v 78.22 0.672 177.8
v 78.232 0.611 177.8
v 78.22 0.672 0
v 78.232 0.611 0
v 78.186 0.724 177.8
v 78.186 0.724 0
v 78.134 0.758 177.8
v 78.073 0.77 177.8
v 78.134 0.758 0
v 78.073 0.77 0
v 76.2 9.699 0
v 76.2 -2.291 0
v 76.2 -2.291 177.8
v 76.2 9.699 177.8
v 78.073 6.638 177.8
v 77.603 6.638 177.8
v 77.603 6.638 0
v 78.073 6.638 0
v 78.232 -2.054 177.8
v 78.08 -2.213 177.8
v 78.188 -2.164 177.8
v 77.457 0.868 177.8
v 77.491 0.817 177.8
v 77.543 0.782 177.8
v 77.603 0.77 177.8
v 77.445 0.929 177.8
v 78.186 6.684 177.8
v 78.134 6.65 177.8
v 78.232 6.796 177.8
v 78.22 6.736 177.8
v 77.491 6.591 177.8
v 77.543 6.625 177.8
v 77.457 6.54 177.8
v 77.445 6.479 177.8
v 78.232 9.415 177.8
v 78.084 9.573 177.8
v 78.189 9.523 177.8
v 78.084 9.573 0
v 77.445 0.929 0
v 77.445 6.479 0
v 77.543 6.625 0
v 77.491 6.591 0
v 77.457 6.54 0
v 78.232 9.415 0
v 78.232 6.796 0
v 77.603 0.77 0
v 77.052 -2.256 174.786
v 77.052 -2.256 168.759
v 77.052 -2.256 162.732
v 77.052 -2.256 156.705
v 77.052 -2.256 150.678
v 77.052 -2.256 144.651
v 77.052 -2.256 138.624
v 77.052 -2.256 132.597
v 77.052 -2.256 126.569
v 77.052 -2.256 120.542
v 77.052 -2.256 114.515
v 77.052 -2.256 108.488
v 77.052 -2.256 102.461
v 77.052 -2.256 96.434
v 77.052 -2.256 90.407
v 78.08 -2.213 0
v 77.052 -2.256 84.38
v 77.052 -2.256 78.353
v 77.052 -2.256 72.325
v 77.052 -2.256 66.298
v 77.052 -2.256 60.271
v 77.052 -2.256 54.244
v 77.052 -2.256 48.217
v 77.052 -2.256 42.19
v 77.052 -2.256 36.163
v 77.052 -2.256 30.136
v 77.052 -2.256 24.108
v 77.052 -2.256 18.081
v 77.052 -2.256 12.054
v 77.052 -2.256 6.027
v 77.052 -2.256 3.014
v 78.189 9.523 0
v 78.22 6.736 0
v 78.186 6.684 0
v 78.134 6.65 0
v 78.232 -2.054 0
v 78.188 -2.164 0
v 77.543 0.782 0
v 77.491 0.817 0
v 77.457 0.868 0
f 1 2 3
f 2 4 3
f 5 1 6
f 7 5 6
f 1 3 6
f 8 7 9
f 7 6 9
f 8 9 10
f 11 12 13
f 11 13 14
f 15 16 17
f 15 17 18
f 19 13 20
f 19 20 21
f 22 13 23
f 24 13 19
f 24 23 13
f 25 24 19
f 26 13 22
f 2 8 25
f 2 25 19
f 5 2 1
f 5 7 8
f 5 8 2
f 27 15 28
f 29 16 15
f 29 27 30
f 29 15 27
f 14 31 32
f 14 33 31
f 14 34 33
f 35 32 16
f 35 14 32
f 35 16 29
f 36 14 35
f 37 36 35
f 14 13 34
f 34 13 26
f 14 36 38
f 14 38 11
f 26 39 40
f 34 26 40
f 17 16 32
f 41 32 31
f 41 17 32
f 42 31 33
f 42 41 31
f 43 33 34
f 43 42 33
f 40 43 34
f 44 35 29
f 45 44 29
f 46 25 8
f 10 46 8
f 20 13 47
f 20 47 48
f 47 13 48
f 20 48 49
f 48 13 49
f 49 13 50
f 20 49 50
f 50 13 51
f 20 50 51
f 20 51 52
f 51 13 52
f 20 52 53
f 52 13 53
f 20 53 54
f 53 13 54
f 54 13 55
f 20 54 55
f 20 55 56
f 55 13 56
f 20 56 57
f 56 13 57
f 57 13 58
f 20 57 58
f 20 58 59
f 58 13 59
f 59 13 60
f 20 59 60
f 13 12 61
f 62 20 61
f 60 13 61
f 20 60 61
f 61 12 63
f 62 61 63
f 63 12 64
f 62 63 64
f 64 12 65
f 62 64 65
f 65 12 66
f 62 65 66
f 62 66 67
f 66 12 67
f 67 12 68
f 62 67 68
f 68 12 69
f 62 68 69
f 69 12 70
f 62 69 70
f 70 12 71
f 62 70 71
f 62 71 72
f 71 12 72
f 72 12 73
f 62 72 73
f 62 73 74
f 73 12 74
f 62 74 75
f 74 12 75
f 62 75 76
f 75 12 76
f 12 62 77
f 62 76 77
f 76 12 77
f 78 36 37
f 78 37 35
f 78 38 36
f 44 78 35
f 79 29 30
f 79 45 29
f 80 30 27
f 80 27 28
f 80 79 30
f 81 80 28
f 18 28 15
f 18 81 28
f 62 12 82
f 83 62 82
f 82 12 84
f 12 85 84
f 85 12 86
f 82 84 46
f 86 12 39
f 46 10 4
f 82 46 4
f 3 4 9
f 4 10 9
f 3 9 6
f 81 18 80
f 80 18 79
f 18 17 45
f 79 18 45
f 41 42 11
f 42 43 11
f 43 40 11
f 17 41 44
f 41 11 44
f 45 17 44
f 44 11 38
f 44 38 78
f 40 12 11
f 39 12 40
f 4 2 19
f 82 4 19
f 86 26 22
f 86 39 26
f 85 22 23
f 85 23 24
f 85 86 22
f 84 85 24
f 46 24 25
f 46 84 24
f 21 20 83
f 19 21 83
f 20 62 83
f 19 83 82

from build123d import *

# Parameters (mm, degrees)
BOSS_EXTRUDE1_DEPTH = 177.8
CUT_EXTRUDE1_REACH  = 236.418
SKETCH3_W           = 0.7874
SKETCH3_H           = 5.8674
FILLET1_R           = 0.15875


with BuildPart() as part:
    # Sketch1 → Boss-Extrude1 (new body)
    with BuildSketch(Plane.XY):
        with BuildLine():
            Line((151.898604, 0.02286), (152.4, 0))
            add(Edge.make_bspline(
                [(152.4, 0), (152.232833718, 0.018502415), (151.571843934, 0.091662545), (150.113999557, 0.2838596), (147.749385864, 0.638650629), (144.555943786, 1.170157002), (140.615360499, 1.859099247), (136.007834995, 2.67146013), (130.806388019, 3.562840017), (125.073826155, 4.486154777), (118.864690135, 5.397753278), (112.233312125, 6.272974236), (105.243489487, 7.106058892), (97.969665406, 7.889319693), (90.492724993, 8.606734858), (82.895253241, 9.240670251), (75.258667902, 9.77749908), (67.662928423, 10.198815718), (60.186827499, 10.49170102), (52.905945954, 10.645080099), (45.891743713, 10.644551806), (39.210681048, 10.486247597), (32.923263797, 10.164412711), (27.083700854, 9.670939726), (21.73719754, 9.016508091), (16.924344759, 8.204081974), (12.676275305, 7.249770479), (9.019815693, 6.174457771), (5.965694819, 5.002018522), (3.544032537, 3.769871526), (1.704834708, 2.531499726), (0.575239506, 1.344737529), (-0.170728015, 0.20310696), (0.337603285, -1.001772228), (1.792943226, -1.546726795), (3.794232235, -2.17716446), (6.643400201, -2.643922316), (10.216110654, -3.041953632), (14.530084187, -3.319872228), (19.533969629, -3.497677255), (25.18692206, -3.577638345), (31.428627275, -3.573848082), (38.191948203, -3.496581442), (45.401595317, -3.349308986), (52.97841726, -3.141841288), (60.83867414, -2.885262261), (68.894988424, -2.587930905), (77.057432025, -2.258882887), (85.235009672, -1.907730283), (93.335426834, -1.550168819), (101.266049649, -1.195465221), (108.93417081, -0.862411006), (116.2464986, -0.557504045), (123.110150899, -0.306936183), (129.431690533, -0.107922528), (135.123521438, 0.027974451), (140.103603919, 0.108900525), (144.29941542, 0.13993859), (147.644768246, 0.124243061), (150.083437285, 0.086502888), (151.399782071, 0.04034956), (151.898604, 0.02286)],
                knots=[0, 0, 0, 0, 0.001635356, 0.006466337, 0.014296592, 0.024884209, 0.037943993, 0.053194137, 0.070376569, 0.089257218, 0.109651763, 0.131396199, 0.15429467, 0.178096903, 0.202530723, 0.227328973, 0.252225807, 0.276966075, 0.301296827, 0.324972089, 0.347773046, 0.369493849, 0.389946985, 0.408979416, 0.42646579, 0.442306729, 0.45642124, 0.468773538, 0.47934515, 0.488155641, 0.495223141, 0.500608248, 0.504417036, 0.507344225, 0.511892731, 0.518766333, 0.5280624, 0.539750485, 0.553781924, 0.570059197, 0.588441486, 0.608747967, 0.630750044, 0.65420771, 0.678865071, 0.70445057, 0.730677503, 0.757253937, 0.783882587, 0.810265561, 0.836095192, 0.861073222, 0.884896986, 0.907258357, 0.92785625, 0.946394646, 0.962618154, 0.976286171, 0.987192828, 0.99514679, 1, 1, 1, 1], degree=3))
        make_face()
    extrude(amount=BOSS_EXTRUDE1_DEPTH)

    # Sketch3 → Cut-Extrude1 (cut, up to next)
    with BuildSketch(Plane.XY.offset(177.8), mode=Mode.PRIVATE) as cut_extrude1_sk1:
        with BuildLine():
            Line((76.2, -2.290863726), (76.2, 9.698555773))
            add(Edge.make_bspline(
                [(76.2, 9.698555773), (75.880486903, 9.71922899), (73.021718792, 9.901577043), (67.662928423, 10.198815718), (60.186827499, 10.49170102), (52.905945954, 10.645080099), (45.891743713, 10.644551806), (39.210681048, 10.486247597), (32.923263797, 10.164412711), (27.083700854, 9.670939726), (21.73719754, 9.016508091), (16.924344759, 8.204081974), (12.676275305, 7.249770479), (9.019815693, 6.174457771), (5.965694819, 5.002018522), (3.544032537, 3.769871526), (1.704834708, 2.531499726), (0.575239506, 1.344737529), (-0.170728015, 0.20310696), (0.337603285, -1.001772228), (1.792943226, -1.546726795), (3.794232235, -2.17716446), (6.643400201, -2.643922316), (10.216110654, -3.041953632), (14.530084187, -3.319872228), (19.533969629, -3.497677255), (25.18692206, -3.577638345), (31.428627275, -3.573848082), (38.191948203, -3.496581442), (45.401595317, -3.349308986), (52.97841726, -3.141841288), (60.83867414, -2.885262261), (68.610964891, -2.598413254), (73.753094803, -2.392038155), (76.2, -2.290863726)],
                knots=[0.249112544, 0.249112544, 0.249112544, 0.249112544, 0.252225807, 0.276966075, 0.301296827, 0.324972089, 0.347773046, 0.369493849, 0.389946985, 0.408979416, 0.42646579, 0.442306729, 0.45642124, 0.468773538, 0.47934515, 0.488155641, 0.495223141, 0.500608248, 0.504417036, 0.507344225, 0.511892731, 0.518766333, 0.5280624, 0.539750485, 0.553781924, 0.570059197, 0.588441486, 0.608747967, 0.630750044, 0.65420771, 0.678865071, 0.70445057, 0.730677503, 0.754490355, 0.754490355, 0.754490355, 0.754490355], degree=3))
        make_face()
    cut_extrude1_tool1 = extrude(cut_extrude1_sk1.sketch, amount=-CUT_EXTRUDE1_REACH, mode=Mode.PRIVATE) & part.part
    # Sketch3 → Cut-Extrude1 (cut, up to next)
    with BuildSketch(Plane.XY.offset(177.8), mode=Mode.PRIVATE) as cut_extrude1_sk2:
        with BuildLine():
            add(Edge.make_bspline(
                [(152.329043318, 0.007856204), (152.185531128, 0.023755853), (151.548249147, 0.094773199), (150.113999557, 0.2838596), (147.749385864, 0.638650629), (144.555943786, 1.170157002), (140.615360499, 1.859099247), (136.007834995, 2.67146013), (130.806388019, 3.562840017), (125.073826155, 4.486154777), (118.864690135, 5.397753278), (112.233312125, 6.272974236), (105.243489487, 7.106058892), (97.969665406, 7.889319693), (90.492724993, 8.606734858), (83.890828887, 9.157599111), (79.789825298, 9.456414677), (78.232, 9.563171971)],
                knots=[0.000231386, 0.000231386, 0.000231386, 0.000231386, 0.001635356, 0.006466337, 0.014296592, 0.024884209, 0.037943993, 0.053194137, 0.070376569, 0.089257218, 0.109651763, 0.131396199, 0.15429467, 0.178096903, 0.202530723, 0.227328973, 0.242511926, 0.242511926, 0.242511926, 0.242511926], degree=3))
            Line((78.232, 9.563171971), (78.232, 6.637546024))
            Line((78.232, 6.637546024), (78.232, 0.770146024))
            Line((78.232, 0.770146024), (78.232, -2.206181248))
            add(Edge.make_bspline(
                [(78.232, -2.206181248), (80.57481261, -2.107809283), (85.628331607, -1.890368614), (93.335426834, -1.550168819), (101.266049649, -1.195465221), (108.93417081, -0.862411006), (116.2464986, -0.557504045), (123.110150899, -0.306936183), (129.431690533, -0.107922528), (135.123521438, 0.027974451), (140.103603919, 0.108900525), (144.29941542, 0.13993859), (147.644768246, 0.124243061), (150.083437285, 0.086502888), (151.399782071, 0.04034956), (151.898604, 0.02286)],
                knots=[0.761082134, 0.761082134, 0.761082134, 0.761082134, 0.783882587, 0.810265561, 0.836095192, 0.861073222, 0.884896986, 0.907258357, 0.92785625, 0.946394646, 0.962618154, 0.976286171, 0.987192828, 0.99514679, 1, 1, 1, 1], degree=3))
            Line((151.898604, 0.02286), (152.4, 0))
            add(Edge.make_bspline(
                [(152.4, 0), (152.376347675, 0.002617903), (152.352695351, 0.005235806), (152.329043318, 0.007856204)],
                knots=[0, 0, 0, 0, 0.000231386, 0.000231386, 0.000231386, 0.000231386], degree=3))
        make_face()
    cut_extrude1_tool2 = extrude(cut_extrude1_sk2.sketch, amount=-CUT_EXTRUDE1_REACH, mode=Mode.PRIVATE) & part.part
    # Sketch3 → Cut-Extrude1 (cut, up to next)
    with BuildSketch(Plane.XY.offset(177.8), mode=Mode.PRIVATE) as cut_extrude1_sk3:
        with Locations((77.8383, 3.703846024)):
            Rectangle(SKETCH3_W, SKETCH3_H)
    cut_extrude1_tool3 = extrude(cut_extrude1_sk3.sketch, amount=-CUT_EXTRUDE1_REACH, mode=Mode.PRIVATE) & part.part
    add(cut_extrude1_tool1.solids().sort_by_distance((41.071648, 3.198464, 177.8))[0], mode=Mode.SUBTRACT)
    add(cut_extrude1_tool2.solids().sort_by_distance((102.964201, 2.96286, 177.8))[0], mode=Mode.SUBTRACT)
    add(cut_extrude1_tool3.solids().sort_by_distance((77.8383, 3.703846, 177.8))[0], mode=Mode.SUBTRACT)

    # Fillet1
    fillet1_edges = [part.edges().sort_by_distance(p)[0] for p in [
        (78.232, -2.206181248, 88.9),
        (78.232, 9.563171971, 88.9),
        (78.232, 0.770146024, 88.9),
        (77.4446, 0.770146024, 88.9),
        (78.232, 6.637546024, 88.9),
        (77.4446, 6.637546024, 88.9),
    ]]
    fillet(fillet1_edges, radius=FILLET1_R)


solid = part.part
